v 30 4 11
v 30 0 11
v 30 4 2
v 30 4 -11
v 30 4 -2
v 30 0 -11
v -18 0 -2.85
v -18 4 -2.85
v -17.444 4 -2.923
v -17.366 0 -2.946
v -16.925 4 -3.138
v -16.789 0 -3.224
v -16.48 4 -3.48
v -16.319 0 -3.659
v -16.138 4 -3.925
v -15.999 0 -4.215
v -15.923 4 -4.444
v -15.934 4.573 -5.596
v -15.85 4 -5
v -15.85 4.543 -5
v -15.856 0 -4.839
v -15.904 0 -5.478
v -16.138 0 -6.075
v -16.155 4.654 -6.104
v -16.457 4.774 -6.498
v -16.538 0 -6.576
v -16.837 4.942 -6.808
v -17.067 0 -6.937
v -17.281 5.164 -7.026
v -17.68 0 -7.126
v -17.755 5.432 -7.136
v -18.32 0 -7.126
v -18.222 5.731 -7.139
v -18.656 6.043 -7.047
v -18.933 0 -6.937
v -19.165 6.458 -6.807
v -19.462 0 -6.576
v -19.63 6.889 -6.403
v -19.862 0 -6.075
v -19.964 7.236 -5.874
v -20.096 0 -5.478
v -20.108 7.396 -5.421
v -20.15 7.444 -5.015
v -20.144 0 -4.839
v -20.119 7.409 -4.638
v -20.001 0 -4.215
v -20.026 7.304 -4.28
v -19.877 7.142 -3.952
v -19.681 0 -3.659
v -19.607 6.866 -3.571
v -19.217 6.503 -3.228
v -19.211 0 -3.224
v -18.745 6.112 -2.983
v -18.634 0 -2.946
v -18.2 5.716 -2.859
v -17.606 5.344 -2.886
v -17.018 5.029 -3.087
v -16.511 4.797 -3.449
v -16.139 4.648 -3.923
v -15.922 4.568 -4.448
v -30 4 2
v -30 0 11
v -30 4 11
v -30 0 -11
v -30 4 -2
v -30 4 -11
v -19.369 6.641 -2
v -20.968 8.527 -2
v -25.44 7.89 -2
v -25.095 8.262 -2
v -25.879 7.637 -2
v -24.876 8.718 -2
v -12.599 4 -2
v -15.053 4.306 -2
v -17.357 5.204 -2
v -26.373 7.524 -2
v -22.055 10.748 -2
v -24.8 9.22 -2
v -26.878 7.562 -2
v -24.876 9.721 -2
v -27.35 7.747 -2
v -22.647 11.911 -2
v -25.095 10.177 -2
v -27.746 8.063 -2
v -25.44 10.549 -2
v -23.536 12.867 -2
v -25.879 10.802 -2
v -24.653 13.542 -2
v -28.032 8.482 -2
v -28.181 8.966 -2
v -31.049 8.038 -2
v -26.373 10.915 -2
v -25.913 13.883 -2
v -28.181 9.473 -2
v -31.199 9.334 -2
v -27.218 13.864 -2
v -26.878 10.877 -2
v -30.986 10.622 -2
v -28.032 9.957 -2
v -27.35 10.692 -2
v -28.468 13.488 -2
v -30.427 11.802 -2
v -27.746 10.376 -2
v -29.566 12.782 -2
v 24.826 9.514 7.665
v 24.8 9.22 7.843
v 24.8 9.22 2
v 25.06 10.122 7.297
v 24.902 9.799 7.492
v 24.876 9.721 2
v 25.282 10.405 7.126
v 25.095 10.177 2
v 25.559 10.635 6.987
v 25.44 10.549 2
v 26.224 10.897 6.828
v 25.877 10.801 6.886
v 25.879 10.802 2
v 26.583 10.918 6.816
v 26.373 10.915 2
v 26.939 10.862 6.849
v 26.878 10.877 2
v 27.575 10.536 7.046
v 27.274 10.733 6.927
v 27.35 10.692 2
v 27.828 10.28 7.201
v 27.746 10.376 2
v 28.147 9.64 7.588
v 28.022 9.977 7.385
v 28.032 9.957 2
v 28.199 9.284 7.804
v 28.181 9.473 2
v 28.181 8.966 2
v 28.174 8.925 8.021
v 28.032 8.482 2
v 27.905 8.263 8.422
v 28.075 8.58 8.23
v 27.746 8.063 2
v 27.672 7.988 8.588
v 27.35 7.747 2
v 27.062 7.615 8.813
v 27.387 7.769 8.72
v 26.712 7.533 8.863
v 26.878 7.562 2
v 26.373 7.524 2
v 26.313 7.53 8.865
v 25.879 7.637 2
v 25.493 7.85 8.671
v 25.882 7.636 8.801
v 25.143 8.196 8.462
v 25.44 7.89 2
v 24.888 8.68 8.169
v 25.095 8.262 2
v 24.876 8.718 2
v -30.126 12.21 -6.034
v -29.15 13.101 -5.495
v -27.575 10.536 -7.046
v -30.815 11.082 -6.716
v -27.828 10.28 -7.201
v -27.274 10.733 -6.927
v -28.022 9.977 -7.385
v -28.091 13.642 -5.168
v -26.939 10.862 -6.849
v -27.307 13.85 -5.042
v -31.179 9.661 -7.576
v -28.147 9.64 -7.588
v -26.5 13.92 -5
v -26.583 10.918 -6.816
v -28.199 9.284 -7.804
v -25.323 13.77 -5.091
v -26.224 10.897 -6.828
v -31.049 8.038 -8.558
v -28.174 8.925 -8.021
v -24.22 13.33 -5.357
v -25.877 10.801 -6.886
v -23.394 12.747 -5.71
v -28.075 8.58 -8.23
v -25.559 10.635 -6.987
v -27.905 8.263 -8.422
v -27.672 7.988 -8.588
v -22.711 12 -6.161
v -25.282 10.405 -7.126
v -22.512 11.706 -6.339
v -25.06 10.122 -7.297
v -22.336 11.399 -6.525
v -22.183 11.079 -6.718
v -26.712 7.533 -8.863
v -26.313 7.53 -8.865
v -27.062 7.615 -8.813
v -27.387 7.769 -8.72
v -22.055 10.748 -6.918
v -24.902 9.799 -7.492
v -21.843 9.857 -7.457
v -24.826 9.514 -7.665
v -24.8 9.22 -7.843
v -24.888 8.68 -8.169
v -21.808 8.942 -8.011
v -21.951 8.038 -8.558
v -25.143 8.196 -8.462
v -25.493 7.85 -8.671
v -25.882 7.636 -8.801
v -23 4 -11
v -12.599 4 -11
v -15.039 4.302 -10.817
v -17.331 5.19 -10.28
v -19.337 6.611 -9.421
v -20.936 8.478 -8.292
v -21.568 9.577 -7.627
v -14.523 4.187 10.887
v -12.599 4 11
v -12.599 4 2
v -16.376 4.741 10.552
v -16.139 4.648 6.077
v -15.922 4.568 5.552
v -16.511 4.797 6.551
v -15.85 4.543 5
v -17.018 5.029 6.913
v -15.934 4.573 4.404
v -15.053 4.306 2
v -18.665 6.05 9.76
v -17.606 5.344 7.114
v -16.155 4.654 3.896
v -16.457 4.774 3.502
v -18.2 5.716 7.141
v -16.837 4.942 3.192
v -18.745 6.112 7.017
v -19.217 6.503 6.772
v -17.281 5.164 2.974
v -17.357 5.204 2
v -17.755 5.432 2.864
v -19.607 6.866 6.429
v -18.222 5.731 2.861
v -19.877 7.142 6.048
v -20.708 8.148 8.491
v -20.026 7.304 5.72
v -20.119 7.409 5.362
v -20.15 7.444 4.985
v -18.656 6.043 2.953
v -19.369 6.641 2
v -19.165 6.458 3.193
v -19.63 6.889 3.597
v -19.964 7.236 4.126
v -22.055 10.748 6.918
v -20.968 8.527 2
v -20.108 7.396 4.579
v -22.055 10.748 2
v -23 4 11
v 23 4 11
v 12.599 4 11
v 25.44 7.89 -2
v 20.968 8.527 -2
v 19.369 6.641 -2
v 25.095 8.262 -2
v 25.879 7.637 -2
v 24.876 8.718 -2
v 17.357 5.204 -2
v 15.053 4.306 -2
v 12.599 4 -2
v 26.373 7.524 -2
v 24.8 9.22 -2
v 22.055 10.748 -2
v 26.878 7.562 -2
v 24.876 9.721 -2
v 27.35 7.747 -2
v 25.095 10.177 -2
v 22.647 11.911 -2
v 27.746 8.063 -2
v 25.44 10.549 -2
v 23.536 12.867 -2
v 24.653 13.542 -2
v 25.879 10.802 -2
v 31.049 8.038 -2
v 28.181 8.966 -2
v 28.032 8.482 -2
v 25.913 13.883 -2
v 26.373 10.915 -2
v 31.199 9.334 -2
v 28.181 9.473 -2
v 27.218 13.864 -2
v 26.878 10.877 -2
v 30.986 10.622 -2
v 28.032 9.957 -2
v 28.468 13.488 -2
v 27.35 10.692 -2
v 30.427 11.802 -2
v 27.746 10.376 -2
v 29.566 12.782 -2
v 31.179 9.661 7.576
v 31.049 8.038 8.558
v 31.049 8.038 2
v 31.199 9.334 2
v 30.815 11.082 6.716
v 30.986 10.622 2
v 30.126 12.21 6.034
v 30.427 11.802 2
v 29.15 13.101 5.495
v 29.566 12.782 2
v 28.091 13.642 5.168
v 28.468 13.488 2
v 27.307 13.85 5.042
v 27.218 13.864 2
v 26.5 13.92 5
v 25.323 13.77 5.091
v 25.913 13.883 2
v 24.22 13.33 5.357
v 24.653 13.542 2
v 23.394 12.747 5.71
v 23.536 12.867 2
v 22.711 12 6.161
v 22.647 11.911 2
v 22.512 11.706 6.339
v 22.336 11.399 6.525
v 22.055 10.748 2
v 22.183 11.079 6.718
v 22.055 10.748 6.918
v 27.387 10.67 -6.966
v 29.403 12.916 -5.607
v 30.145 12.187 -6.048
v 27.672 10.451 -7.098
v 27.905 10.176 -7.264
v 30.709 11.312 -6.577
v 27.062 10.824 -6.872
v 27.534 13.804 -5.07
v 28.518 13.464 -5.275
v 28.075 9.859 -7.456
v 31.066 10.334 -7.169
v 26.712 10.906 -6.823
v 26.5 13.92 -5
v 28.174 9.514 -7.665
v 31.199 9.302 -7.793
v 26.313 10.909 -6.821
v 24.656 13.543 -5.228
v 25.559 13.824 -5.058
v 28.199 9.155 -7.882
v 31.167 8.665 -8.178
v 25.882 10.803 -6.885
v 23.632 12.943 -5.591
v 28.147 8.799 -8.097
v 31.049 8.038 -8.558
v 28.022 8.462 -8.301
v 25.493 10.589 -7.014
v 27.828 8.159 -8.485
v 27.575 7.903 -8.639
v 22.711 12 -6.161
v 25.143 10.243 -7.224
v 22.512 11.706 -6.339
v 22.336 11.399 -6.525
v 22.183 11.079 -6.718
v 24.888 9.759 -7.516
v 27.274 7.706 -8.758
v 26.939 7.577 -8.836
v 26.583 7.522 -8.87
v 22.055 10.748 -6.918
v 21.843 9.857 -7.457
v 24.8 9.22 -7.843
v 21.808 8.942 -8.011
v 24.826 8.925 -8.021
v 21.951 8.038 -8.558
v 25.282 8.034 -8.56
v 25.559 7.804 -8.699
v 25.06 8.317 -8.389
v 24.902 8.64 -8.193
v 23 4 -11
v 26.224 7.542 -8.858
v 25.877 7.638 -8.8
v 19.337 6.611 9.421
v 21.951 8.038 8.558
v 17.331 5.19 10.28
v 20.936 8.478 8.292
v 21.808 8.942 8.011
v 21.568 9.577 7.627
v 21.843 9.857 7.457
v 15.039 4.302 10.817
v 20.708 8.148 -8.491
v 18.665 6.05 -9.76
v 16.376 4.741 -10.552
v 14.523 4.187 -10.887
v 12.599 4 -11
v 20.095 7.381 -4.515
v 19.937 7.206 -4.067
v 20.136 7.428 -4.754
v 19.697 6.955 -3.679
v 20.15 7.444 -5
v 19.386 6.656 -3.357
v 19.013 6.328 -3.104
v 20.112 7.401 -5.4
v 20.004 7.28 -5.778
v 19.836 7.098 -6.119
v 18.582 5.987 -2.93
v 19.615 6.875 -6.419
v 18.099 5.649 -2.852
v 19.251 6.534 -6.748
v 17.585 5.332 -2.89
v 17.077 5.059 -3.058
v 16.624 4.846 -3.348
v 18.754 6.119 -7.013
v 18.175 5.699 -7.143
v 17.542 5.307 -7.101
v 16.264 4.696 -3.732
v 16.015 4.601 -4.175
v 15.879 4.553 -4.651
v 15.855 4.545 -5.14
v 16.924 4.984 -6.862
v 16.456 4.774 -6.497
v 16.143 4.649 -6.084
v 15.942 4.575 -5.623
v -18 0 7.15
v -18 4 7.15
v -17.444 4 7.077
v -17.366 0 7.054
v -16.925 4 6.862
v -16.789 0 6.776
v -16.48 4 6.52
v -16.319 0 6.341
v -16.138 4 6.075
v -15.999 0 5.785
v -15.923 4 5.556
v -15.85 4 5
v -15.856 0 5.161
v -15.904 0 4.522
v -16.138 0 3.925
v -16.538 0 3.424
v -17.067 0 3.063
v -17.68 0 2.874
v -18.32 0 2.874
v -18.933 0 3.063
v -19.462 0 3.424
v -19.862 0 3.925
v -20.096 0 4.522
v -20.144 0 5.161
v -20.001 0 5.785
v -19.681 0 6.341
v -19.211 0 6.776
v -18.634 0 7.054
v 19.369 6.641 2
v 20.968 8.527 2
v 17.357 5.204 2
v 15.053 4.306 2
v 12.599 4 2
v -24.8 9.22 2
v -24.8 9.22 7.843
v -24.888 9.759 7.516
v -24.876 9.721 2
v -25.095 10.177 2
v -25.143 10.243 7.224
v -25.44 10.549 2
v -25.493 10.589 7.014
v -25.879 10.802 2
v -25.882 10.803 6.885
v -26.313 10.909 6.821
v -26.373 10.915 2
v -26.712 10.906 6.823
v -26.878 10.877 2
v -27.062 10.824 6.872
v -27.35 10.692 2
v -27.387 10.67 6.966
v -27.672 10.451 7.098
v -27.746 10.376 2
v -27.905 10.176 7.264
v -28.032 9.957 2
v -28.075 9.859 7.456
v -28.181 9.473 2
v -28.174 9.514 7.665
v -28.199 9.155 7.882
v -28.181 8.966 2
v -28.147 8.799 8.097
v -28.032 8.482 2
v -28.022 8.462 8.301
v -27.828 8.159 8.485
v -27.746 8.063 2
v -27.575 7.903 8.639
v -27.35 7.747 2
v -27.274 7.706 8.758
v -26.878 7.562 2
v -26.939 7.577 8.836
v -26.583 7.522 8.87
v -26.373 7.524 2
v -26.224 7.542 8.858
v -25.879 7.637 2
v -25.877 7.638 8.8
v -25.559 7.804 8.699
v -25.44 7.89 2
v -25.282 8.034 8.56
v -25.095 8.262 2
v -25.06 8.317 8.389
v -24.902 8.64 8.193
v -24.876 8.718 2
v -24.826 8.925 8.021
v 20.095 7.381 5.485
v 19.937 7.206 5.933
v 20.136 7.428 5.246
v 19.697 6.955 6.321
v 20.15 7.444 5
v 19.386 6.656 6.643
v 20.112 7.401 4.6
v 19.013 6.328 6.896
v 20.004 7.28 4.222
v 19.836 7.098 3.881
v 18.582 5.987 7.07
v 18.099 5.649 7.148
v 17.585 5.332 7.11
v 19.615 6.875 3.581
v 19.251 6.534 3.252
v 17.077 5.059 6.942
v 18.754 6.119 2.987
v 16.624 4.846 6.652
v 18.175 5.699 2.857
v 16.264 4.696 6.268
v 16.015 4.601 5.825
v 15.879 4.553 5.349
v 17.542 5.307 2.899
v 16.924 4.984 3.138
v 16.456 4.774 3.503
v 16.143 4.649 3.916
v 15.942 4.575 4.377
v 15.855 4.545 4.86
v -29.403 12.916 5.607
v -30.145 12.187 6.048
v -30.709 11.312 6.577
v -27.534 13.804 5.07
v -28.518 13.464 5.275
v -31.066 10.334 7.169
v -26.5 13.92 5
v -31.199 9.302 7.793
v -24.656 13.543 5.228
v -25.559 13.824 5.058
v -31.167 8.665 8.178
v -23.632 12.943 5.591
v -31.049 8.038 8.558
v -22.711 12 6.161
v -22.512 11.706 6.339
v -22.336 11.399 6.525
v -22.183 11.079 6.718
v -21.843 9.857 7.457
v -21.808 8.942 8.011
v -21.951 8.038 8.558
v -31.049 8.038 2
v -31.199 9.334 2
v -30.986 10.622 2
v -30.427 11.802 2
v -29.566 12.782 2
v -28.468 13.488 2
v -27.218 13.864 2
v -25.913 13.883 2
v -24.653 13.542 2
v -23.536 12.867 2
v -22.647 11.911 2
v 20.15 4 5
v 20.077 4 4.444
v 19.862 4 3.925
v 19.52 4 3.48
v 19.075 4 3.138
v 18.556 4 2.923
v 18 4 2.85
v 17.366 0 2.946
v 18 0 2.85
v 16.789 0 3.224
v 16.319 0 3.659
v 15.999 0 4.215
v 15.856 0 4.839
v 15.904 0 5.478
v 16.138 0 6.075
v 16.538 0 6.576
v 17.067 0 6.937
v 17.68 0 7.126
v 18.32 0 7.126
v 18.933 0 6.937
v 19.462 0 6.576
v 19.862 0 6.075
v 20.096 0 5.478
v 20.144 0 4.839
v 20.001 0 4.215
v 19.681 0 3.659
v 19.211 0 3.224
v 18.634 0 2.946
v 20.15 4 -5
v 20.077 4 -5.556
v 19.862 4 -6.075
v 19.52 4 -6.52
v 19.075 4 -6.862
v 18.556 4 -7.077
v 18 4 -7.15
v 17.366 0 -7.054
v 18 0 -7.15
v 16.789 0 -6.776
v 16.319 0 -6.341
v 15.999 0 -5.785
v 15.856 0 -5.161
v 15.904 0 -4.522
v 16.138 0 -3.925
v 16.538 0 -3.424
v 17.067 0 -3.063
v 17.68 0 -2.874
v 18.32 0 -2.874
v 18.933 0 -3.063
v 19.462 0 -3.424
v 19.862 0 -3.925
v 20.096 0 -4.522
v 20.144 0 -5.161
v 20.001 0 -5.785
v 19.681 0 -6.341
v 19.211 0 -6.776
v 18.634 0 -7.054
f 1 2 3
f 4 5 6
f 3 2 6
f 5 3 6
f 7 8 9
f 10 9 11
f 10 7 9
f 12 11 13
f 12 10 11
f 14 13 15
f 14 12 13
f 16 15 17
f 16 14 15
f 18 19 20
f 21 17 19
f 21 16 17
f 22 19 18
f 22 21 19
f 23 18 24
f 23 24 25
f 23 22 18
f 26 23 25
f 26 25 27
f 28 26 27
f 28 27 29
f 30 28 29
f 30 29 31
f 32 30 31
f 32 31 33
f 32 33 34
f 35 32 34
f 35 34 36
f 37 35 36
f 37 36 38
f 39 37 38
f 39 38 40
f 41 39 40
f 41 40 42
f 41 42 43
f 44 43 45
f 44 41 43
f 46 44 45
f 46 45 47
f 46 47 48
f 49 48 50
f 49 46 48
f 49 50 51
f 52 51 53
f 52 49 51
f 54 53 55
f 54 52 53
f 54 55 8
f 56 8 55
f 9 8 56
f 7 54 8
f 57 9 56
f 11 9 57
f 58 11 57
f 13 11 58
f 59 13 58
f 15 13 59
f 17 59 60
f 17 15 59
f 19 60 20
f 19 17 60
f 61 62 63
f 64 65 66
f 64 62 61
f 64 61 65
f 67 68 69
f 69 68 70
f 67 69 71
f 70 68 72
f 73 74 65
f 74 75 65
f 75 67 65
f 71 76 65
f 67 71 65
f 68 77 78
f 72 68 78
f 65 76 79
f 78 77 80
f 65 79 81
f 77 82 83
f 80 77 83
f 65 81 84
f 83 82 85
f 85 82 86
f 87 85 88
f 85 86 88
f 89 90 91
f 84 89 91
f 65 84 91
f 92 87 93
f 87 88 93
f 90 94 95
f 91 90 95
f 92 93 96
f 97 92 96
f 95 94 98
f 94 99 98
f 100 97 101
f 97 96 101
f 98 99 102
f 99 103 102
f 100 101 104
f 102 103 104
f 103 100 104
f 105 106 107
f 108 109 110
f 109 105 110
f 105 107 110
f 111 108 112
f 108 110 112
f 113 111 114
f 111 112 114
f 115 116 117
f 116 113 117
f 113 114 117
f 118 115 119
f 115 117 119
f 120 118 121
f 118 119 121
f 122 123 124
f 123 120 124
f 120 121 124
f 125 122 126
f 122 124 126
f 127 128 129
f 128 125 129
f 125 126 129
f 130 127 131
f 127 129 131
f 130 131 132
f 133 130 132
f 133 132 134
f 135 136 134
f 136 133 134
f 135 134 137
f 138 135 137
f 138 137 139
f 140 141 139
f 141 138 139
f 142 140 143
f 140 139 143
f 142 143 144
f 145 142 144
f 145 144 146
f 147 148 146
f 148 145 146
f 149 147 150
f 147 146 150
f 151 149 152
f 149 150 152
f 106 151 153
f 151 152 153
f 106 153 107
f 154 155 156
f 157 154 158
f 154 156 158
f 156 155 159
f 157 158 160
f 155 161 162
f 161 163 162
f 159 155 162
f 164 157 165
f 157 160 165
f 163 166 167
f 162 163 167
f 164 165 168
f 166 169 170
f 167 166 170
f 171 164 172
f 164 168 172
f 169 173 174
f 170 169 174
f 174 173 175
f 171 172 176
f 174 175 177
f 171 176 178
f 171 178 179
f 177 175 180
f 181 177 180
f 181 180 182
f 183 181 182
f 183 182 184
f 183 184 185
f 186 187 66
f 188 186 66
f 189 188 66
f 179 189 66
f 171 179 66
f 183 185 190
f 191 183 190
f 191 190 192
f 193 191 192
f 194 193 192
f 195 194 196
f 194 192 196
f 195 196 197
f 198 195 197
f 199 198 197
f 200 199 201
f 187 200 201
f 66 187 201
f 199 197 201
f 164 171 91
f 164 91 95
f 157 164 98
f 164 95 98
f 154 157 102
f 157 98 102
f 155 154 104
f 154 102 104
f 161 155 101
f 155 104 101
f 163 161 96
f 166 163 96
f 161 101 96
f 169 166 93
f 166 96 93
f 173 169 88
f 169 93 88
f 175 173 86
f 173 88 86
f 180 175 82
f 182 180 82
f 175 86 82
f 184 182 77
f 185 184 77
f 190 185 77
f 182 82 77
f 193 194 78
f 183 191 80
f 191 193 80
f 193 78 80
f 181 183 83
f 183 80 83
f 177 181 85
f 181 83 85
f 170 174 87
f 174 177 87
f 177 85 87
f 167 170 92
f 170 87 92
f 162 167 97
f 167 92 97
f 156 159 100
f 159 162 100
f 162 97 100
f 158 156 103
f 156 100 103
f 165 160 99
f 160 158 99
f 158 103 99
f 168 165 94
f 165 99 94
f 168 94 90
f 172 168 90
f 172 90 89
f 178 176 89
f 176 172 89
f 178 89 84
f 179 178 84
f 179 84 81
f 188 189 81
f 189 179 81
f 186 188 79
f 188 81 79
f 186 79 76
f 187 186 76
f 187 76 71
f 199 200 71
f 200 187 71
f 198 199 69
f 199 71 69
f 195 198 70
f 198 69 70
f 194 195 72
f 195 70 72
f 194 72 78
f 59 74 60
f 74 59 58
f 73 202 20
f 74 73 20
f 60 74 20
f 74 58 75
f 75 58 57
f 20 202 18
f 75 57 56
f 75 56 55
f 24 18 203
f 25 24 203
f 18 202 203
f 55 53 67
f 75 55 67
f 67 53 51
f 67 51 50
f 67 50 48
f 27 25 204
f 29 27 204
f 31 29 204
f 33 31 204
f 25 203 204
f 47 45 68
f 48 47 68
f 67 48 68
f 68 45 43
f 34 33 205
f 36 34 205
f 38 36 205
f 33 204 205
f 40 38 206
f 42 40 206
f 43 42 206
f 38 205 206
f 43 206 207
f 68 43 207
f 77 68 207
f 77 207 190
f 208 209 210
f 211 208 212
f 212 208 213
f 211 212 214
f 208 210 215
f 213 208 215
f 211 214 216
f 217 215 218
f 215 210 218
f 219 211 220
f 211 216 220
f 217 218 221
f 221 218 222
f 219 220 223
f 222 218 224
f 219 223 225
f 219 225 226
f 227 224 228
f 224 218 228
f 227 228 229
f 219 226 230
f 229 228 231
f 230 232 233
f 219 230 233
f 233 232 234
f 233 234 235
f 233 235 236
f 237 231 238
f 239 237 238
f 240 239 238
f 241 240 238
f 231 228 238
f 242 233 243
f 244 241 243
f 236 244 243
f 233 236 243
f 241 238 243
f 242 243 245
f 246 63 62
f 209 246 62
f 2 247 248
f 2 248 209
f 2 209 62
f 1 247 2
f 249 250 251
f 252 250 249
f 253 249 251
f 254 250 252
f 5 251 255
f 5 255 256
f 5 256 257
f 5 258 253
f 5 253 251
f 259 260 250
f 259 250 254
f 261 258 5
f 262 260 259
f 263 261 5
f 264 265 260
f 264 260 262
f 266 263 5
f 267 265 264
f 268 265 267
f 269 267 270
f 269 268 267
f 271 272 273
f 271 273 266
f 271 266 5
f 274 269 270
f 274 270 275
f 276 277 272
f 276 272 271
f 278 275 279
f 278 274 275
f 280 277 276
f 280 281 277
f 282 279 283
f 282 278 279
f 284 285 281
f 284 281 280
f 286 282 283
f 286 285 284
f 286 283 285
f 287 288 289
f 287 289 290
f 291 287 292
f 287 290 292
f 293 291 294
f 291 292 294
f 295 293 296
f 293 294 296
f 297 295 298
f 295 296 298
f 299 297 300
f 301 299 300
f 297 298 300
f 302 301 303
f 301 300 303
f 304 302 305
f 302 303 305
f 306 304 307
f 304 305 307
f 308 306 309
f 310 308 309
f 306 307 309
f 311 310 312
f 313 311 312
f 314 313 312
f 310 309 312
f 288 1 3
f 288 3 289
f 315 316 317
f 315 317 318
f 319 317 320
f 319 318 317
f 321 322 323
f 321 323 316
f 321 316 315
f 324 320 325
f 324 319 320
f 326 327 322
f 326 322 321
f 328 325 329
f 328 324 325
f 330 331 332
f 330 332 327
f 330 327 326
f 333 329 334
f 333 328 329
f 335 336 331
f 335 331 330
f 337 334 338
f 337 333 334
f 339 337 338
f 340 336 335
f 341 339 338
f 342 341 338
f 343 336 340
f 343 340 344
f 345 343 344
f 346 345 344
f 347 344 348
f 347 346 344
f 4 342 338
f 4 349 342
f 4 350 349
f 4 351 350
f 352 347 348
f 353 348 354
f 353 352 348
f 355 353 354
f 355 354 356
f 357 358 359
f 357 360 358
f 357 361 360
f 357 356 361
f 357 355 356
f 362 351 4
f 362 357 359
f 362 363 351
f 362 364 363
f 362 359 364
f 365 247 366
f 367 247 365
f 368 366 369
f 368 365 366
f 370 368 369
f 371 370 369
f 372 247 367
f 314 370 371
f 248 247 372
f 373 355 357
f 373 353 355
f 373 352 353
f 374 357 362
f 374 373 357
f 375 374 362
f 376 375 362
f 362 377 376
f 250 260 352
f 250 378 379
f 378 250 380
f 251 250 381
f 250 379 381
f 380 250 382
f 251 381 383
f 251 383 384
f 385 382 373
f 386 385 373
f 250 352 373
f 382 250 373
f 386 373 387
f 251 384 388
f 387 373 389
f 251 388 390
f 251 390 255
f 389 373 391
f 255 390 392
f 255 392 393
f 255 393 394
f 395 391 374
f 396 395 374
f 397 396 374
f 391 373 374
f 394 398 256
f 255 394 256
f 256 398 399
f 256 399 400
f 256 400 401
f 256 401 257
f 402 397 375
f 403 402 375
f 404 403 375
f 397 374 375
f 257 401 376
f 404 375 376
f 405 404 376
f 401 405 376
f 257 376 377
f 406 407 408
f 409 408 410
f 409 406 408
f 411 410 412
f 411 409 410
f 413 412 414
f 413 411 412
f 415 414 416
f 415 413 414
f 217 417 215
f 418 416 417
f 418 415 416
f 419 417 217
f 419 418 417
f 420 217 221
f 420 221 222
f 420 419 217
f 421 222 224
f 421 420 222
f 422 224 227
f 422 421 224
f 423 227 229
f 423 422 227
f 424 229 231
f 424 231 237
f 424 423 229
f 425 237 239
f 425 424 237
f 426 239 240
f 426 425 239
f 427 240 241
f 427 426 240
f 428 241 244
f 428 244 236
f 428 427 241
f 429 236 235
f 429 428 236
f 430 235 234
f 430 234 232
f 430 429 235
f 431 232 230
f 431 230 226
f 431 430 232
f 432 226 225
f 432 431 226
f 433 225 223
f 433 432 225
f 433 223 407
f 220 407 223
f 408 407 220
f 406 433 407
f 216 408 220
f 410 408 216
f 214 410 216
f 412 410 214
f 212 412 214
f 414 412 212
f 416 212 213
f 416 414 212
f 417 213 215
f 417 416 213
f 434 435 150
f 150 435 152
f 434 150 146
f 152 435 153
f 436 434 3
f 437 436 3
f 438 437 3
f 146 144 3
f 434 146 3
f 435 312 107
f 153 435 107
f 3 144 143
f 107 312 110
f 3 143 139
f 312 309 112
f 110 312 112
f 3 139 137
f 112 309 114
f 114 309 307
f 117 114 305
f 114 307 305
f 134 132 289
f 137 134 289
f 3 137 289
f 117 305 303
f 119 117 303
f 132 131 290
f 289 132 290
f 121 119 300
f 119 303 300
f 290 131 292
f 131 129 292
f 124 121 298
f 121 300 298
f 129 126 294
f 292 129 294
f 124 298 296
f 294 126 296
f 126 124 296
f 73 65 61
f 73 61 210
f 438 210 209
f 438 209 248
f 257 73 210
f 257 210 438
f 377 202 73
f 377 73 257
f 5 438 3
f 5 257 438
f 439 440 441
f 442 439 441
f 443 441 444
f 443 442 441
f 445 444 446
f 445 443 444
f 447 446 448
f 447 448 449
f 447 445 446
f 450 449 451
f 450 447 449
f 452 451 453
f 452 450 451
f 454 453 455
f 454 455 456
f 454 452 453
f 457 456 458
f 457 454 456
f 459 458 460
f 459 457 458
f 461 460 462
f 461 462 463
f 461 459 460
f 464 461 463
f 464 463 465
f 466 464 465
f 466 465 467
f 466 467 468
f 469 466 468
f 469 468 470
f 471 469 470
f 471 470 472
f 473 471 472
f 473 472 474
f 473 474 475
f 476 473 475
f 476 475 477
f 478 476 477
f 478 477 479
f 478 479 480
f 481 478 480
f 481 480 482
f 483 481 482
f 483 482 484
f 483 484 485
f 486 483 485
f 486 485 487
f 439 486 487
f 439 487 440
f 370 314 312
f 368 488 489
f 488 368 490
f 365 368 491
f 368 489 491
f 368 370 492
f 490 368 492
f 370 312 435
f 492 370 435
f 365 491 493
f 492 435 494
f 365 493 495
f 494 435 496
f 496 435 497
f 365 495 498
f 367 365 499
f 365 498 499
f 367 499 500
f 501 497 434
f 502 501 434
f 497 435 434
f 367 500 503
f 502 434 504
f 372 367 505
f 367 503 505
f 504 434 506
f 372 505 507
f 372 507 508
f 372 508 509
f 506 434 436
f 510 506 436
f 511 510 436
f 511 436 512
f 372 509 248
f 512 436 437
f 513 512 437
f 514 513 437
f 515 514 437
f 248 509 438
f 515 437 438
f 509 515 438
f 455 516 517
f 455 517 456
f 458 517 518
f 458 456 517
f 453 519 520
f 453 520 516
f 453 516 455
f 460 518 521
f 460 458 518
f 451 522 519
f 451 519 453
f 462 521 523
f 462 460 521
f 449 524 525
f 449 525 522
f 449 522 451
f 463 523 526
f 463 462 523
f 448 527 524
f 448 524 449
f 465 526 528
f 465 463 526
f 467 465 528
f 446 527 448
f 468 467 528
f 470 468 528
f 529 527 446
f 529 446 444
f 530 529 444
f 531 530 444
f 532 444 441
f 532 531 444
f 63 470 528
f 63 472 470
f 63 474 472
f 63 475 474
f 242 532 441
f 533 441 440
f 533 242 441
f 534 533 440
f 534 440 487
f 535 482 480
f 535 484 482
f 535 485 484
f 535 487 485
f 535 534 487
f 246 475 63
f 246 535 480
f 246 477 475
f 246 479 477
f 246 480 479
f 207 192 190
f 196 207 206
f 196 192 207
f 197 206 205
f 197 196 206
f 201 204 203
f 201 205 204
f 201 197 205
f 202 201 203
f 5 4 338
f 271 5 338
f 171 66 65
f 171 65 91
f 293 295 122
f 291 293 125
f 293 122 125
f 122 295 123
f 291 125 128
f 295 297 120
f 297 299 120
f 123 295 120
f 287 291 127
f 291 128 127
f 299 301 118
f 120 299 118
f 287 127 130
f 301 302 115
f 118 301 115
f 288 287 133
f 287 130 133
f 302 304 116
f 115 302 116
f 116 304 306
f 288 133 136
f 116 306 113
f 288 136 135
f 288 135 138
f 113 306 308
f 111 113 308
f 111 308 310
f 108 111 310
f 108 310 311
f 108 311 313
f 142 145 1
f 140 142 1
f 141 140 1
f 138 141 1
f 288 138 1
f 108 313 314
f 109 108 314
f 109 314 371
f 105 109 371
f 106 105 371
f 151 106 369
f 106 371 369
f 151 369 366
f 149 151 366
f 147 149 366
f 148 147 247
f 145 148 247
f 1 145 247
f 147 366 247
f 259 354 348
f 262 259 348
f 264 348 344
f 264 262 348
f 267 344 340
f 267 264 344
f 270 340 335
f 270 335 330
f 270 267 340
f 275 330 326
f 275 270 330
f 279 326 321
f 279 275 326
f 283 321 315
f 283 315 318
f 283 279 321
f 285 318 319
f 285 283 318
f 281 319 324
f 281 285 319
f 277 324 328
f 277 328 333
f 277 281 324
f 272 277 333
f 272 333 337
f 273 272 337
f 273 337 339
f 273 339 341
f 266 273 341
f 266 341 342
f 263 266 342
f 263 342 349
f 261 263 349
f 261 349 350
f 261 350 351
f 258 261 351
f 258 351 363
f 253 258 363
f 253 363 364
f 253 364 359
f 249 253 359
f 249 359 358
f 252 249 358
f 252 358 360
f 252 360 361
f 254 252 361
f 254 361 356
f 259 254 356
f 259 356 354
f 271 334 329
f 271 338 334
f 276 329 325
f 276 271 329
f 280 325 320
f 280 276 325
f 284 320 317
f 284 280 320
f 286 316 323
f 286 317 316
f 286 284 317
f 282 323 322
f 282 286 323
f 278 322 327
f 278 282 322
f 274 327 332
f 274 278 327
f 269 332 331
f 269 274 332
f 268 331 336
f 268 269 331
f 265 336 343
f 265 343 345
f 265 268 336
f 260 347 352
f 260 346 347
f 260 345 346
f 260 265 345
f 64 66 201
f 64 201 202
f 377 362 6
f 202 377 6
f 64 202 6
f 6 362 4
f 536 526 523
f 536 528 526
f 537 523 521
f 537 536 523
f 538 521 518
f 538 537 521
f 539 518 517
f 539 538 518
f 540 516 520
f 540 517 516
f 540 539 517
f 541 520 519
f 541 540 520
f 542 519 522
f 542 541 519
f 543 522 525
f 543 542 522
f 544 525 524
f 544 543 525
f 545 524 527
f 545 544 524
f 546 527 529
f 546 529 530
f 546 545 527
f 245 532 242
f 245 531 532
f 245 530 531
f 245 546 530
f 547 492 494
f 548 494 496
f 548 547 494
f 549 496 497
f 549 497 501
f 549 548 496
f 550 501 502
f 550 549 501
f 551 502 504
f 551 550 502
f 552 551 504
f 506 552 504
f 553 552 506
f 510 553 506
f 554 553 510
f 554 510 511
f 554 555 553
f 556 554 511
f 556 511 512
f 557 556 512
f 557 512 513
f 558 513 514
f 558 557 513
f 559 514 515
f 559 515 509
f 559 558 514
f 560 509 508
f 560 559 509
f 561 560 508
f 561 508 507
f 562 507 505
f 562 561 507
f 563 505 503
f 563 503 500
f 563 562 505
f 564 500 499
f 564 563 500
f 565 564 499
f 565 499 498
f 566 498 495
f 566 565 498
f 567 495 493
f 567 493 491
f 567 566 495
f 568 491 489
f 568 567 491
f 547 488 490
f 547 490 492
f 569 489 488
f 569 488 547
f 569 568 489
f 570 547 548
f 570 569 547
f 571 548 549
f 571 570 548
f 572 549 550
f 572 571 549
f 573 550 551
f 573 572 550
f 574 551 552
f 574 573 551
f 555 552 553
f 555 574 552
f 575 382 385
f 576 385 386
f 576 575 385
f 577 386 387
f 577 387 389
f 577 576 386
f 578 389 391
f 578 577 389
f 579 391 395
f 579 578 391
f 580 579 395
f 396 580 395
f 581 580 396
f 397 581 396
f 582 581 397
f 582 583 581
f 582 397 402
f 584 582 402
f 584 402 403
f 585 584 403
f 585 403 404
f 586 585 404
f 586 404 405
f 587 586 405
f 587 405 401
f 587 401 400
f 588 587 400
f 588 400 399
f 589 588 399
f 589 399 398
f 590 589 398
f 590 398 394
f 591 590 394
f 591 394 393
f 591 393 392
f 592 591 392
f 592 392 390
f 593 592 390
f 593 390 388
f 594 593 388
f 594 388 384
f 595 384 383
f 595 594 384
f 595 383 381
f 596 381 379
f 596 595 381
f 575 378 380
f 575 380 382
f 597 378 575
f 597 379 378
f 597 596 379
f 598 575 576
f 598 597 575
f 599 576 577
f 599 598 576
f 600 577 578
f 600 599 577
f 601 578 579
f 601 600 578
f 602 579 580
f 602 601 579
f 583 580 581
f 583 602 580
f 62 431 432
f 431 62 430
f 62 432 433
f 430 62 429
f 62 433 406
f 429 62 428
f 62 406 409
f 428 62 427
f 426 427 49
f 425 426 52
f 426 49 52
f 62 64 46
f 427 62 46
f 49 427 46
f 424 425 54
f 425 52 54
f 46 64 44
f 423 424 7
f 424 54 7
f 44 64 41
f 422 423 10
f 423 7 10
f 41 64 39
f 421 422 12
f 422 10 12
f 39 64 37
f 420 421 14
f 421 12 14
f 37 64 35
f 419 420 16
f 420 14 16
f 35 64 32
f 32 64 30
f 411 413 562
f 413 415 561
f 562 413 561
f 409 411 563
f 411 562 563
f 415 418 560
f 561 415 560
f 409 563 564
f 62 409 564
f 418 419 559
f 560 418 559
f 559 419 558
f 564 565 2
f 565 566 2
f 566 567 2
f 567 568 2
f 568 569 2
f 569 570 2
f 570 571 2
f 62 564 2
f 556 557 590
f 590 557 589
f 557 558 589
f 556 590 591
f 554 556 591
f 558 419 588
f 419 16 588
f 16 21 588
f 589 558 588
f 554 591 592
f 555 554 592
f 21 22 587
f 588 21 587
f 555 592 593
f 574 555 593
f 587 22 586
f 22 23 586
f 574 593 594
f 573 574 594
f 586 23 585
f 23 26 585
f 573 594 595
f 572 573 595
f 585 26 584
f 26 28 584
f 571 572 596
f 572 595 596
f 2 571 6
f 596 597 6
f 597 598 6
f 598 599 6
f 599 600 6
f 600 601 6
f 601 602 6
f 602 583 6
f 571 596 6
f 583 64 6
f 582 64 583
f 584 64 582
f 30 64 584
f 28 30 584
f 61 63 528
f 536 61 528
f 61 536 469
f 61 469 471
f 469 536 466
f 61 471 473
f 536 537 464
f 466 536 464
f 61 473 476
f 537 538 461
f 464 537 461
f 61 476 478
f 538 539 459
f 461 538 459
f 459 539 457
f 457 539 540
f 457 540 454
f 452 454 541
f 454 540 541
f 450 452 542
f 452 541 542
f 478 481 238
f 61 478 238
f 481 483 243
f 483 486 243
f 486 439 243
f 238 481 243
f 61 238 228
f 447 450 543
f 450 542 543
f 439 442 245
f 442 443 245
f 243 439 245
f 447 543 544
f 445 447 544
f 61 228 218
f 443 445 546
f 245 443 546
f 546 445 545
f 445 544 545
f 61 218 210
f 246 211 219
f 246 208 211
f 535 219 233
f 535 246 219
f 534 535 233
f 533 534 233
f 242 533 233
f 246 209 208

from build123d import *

# Parameters (mm, degrees)
SKETCH1_W               = 60
SKETCH1_H               = 22
SKETCH1_R               = 2.15
BOSS_EXTRUDE1_DEPTH     = 4
SKETCH2_R               = 1.7
BOSS_EXTRUDE2_DEPTH     = 9
CUT_EXTRUDE1_DEPTH      = 34
MIRROR5_COPY_1_SKETCH_R = 1.7
MIRROR5_COPY_1_DEPTH    = 9
MIRROR5_COPY_2_DEPTH    = 34
FILLET1_START           = -11.0000001
FILLET1_DEPTH           = 9.0000001
FILLET1_START_2         = 2
FILLET1_2_DEPTH         = 9
FILLET1_START_3         = 4
FILLET1_3_OUTLINE_R     = 2.15
FILLET1_3_DEPTH         = 4.037755723
FILLET1_START_4         = -30
FILLET1_4_DEPTH         = 60


with BuildPart() as part:
    # Sketch1 → Boss-Extrude1 (new body)
    with BuildSketch(Plane(origin=(0, 0, 0), x_dir=(1, 0, 0), z_dir=(0, 1, 0))):
        Rectangle(SKETCH1_W, SKETCH1_H)
        with Locations(Location((-18, 5, 0), (0, 0, 270))):
            Circle(SKETCH1_R, mode=Mode.SUBTRACT)
        with Locations(Location((-18, -5, 0), (0, 0, 270))):
            Circle(SKETCH1_R, mode=Mode.SUBTRACT)
        with Locations(Location((18, 5, 0), (0, 0, 90))):
            Circle(SKETCH1_R, mode=Mode.SUBTRACT)
        with Locations(Location((18, -5, 0), (0, 0, 90))):
            Circle(SKETCH1_R, mode=Mode.SUBTRACT)
    extrude(amount=BOSS_EXTRUDE1_DEPTH)

    # Sketch2 → Boss-Extrude2 (add)
    with BuildSketch(Plane.XY.offset(2)):
        with BuildLine():
            Line((-30, 4), (-31.048991933, 8.037755723))
            ThreePointArc((-31.048991933, 8.037755723), (-26.5, 13.919564671), (-21.951008067, 8.037755723))
            Line((-21.951008067, 8.037755723), (-23, 4))
            Line((-23, 4), (-30, 4))
        make_face()
        with Locations((-26.5, 9.219564671)):
            Circle(SKETCH2_R, mode=Mode.SUBTRACT)
    boss_extrude2 = extrude(amount=BOSS_EXTRUDE2_DEPTH)

    # Sketch3 → Cut-Extrude1 (cut)
    with BuildSketch(Plane(origin=(0, 0, 0), x_dir=(0, 0, -1), z_dir=(1, 0, 0))):
        Polygon((-5, 13.919564671), (-11, 4), (-11, 13.919564671), align=None)
    cut_extrude1 = extrude(amount=-CUT_EXTRUDE1_DEPTH, mode=Mode.SUBTRACT)

    # Mirror4: Boss-Extrude2, Cut-Extrude1 across plane
    add(boss_extrude2.mirror(Plane.XY))
    add(cut_extrude1.mirror(Plane.XY), mode=Mode.SUBTRACT)

    # Mirror5: Boss-Extrude2, Cut-Extrude1 across plane
    add(boss_extrude2.mirror(Plane(origin=(0, 0, 0), x_dir=(0, 0, 1), z_dir=(1, 0, 0))))
    add(cut_extrude1.mirror(Plane(origin=(0, 0, 0), x_dir=(0, 0, 1), z_dir=(1, 0, 0))), mode=Mode.SUBTRACT)

    # Mirror5 copy 1 sketch → Mirror5 copy 1 (add)
    with BuildSketch(Plane(origin=(0, 0, -2), x_dir=(-1, 0, 0), z_dir=(0, 0, -1))):
        with BuildLine():
            Line((-30, 4), (-31.048991933, 8.037755723))
            ThreePointArc((-31.048991933, 8.037755723), (-26.5, 13.919564671), (-21.951008067, 8.037755723))
            Line((-21.951008067, 8.037755723), (-23, 4))
            Line((-23, 4), (-30, 4))
        make_face()
        with Locations((-26.5, 9.219564671)):
            Circle(MIRROR5_COPY_1_SKETCH_R, mode=Mode.SUBTRACT)
    extrude(amount=MIRROR5_COPY_1_DEPTH)

    # Mirror5 copy 2 sketch → Mirror5 copy 2 (cut)
    with BuildSketch(Plane.ZY):
        Polygon((-5, 13.919564671), (-11, 4), (-11, 13.919564671), align=None)
    extrude(amount=-MIRROR5_COPY_2_DEPTH, mode=Mode.SUBTRACT)

    # Fillet1: read off the stored shape, not the designer's step
    # Fillet1 outline → Fillet1 (add)
    with BuildSketch(Plane.XY.offset(FILLET1_START)):
        with BuildLine():
            ThreePointArc((21.951008067, 8.037755723), (21.80348703, 9.400578254), (22.055466759, 10.748003177))
            ThreePointArc((22.055466759, 10.748003177), (18.407628714, 5.859976406), (12.599013054, 4))
            Line((12.599013054, 4), (23, 4))
            Line((23, 4), (21.951008067, 8.037755723))
        make_face()
        with BuildLine():
            Line((-23, 4), (-12.599013054, 4))
            ThreePointArc((-12.599013054, 4), (-18.407628714, 5.859976406), (-22.055466759, 10.748003177))
            ThreePointArc((-22.055466759, 10.748003177), (-21.80348703, 9.400578254), (-21.951008067, 8.037755723))
            Line((-21.951008067, 8.037755723), (-23, 4))
        make_face()
    extrude(amount=FILLET1_DEPTH)

    # Fillet1 2 outline → Fillet1 2 (add)
    with BuildSketch(Plane.XY.offset(FILLET1_START_2)):
        with BuildLine():
            ThreePointArc((21.951008067, 8.037755723), (21.80348703, 9.400578254), (22.055466759, 10.748003177))
            ThreePointArc((22.055466759, 10.748003177), (18.407628714, 5.859976406), (12.599013054, 4))
            Line((12.599013054, 4), (23, 4))
            Line((23, 4), (21.951008067, 8.037755723))
        make_face()
        with BuildLine():
            Line((-23, 4), (-12.599013054, 4))
            ThreePointArc((-12.599013054, 4), (-18.407628714, 5.859976406), (-22.055466759, 10.748003177))
            ThreePointArc((-22.055466759, 10.748003177), (-21.80348703, 9.400578254), (-21.951008067, 8.037755723))
            Line((-21.951008067, 8.037755723), (-23, 4))
        make_face()
    extrude(amount=FILLET1_2_DEPTH)

    # Fillet1 3 outline → Fillet1 3 (cut)
    with BuildSketch(Plane(origin=(0, 0, 0), x_dir=(1, 0, 0), z_dir=(0, 1, 0)).offset(FILLET1_START_3)):
        with Locations((-18, -5)):
            Circle(FILLET1_3_OUTLINE_R)
        with Locations((-18, 5)):
            Circle(FILLET1_3_OUTLINE_R)
        with Locations((18, 5)):
            Circle(FILLET1_3_OUTLINE_R)
        with Locations((18, -5)):
            Circle(FILLET1_3_OUTLINE_R)
    extrude(amount=FILLET1_3_DEPTH, mode=Mode.SUBTRACT)

    # Fillet1 4 outline → Fillet1 4 (cut)
    with BuildSketch(Plane.YZ.offset(FILLET1_START_4)):
        Polygon((12, 11), (4, 11), (12, 6.161077971), align=None)
        Polygon((12, -11), (12, -6.161077971), (4, -11), align=None)
    extrude(amount=FILLET1_4_DEPTH, mode=Mode.SUBTRACT)


solid = part.part
